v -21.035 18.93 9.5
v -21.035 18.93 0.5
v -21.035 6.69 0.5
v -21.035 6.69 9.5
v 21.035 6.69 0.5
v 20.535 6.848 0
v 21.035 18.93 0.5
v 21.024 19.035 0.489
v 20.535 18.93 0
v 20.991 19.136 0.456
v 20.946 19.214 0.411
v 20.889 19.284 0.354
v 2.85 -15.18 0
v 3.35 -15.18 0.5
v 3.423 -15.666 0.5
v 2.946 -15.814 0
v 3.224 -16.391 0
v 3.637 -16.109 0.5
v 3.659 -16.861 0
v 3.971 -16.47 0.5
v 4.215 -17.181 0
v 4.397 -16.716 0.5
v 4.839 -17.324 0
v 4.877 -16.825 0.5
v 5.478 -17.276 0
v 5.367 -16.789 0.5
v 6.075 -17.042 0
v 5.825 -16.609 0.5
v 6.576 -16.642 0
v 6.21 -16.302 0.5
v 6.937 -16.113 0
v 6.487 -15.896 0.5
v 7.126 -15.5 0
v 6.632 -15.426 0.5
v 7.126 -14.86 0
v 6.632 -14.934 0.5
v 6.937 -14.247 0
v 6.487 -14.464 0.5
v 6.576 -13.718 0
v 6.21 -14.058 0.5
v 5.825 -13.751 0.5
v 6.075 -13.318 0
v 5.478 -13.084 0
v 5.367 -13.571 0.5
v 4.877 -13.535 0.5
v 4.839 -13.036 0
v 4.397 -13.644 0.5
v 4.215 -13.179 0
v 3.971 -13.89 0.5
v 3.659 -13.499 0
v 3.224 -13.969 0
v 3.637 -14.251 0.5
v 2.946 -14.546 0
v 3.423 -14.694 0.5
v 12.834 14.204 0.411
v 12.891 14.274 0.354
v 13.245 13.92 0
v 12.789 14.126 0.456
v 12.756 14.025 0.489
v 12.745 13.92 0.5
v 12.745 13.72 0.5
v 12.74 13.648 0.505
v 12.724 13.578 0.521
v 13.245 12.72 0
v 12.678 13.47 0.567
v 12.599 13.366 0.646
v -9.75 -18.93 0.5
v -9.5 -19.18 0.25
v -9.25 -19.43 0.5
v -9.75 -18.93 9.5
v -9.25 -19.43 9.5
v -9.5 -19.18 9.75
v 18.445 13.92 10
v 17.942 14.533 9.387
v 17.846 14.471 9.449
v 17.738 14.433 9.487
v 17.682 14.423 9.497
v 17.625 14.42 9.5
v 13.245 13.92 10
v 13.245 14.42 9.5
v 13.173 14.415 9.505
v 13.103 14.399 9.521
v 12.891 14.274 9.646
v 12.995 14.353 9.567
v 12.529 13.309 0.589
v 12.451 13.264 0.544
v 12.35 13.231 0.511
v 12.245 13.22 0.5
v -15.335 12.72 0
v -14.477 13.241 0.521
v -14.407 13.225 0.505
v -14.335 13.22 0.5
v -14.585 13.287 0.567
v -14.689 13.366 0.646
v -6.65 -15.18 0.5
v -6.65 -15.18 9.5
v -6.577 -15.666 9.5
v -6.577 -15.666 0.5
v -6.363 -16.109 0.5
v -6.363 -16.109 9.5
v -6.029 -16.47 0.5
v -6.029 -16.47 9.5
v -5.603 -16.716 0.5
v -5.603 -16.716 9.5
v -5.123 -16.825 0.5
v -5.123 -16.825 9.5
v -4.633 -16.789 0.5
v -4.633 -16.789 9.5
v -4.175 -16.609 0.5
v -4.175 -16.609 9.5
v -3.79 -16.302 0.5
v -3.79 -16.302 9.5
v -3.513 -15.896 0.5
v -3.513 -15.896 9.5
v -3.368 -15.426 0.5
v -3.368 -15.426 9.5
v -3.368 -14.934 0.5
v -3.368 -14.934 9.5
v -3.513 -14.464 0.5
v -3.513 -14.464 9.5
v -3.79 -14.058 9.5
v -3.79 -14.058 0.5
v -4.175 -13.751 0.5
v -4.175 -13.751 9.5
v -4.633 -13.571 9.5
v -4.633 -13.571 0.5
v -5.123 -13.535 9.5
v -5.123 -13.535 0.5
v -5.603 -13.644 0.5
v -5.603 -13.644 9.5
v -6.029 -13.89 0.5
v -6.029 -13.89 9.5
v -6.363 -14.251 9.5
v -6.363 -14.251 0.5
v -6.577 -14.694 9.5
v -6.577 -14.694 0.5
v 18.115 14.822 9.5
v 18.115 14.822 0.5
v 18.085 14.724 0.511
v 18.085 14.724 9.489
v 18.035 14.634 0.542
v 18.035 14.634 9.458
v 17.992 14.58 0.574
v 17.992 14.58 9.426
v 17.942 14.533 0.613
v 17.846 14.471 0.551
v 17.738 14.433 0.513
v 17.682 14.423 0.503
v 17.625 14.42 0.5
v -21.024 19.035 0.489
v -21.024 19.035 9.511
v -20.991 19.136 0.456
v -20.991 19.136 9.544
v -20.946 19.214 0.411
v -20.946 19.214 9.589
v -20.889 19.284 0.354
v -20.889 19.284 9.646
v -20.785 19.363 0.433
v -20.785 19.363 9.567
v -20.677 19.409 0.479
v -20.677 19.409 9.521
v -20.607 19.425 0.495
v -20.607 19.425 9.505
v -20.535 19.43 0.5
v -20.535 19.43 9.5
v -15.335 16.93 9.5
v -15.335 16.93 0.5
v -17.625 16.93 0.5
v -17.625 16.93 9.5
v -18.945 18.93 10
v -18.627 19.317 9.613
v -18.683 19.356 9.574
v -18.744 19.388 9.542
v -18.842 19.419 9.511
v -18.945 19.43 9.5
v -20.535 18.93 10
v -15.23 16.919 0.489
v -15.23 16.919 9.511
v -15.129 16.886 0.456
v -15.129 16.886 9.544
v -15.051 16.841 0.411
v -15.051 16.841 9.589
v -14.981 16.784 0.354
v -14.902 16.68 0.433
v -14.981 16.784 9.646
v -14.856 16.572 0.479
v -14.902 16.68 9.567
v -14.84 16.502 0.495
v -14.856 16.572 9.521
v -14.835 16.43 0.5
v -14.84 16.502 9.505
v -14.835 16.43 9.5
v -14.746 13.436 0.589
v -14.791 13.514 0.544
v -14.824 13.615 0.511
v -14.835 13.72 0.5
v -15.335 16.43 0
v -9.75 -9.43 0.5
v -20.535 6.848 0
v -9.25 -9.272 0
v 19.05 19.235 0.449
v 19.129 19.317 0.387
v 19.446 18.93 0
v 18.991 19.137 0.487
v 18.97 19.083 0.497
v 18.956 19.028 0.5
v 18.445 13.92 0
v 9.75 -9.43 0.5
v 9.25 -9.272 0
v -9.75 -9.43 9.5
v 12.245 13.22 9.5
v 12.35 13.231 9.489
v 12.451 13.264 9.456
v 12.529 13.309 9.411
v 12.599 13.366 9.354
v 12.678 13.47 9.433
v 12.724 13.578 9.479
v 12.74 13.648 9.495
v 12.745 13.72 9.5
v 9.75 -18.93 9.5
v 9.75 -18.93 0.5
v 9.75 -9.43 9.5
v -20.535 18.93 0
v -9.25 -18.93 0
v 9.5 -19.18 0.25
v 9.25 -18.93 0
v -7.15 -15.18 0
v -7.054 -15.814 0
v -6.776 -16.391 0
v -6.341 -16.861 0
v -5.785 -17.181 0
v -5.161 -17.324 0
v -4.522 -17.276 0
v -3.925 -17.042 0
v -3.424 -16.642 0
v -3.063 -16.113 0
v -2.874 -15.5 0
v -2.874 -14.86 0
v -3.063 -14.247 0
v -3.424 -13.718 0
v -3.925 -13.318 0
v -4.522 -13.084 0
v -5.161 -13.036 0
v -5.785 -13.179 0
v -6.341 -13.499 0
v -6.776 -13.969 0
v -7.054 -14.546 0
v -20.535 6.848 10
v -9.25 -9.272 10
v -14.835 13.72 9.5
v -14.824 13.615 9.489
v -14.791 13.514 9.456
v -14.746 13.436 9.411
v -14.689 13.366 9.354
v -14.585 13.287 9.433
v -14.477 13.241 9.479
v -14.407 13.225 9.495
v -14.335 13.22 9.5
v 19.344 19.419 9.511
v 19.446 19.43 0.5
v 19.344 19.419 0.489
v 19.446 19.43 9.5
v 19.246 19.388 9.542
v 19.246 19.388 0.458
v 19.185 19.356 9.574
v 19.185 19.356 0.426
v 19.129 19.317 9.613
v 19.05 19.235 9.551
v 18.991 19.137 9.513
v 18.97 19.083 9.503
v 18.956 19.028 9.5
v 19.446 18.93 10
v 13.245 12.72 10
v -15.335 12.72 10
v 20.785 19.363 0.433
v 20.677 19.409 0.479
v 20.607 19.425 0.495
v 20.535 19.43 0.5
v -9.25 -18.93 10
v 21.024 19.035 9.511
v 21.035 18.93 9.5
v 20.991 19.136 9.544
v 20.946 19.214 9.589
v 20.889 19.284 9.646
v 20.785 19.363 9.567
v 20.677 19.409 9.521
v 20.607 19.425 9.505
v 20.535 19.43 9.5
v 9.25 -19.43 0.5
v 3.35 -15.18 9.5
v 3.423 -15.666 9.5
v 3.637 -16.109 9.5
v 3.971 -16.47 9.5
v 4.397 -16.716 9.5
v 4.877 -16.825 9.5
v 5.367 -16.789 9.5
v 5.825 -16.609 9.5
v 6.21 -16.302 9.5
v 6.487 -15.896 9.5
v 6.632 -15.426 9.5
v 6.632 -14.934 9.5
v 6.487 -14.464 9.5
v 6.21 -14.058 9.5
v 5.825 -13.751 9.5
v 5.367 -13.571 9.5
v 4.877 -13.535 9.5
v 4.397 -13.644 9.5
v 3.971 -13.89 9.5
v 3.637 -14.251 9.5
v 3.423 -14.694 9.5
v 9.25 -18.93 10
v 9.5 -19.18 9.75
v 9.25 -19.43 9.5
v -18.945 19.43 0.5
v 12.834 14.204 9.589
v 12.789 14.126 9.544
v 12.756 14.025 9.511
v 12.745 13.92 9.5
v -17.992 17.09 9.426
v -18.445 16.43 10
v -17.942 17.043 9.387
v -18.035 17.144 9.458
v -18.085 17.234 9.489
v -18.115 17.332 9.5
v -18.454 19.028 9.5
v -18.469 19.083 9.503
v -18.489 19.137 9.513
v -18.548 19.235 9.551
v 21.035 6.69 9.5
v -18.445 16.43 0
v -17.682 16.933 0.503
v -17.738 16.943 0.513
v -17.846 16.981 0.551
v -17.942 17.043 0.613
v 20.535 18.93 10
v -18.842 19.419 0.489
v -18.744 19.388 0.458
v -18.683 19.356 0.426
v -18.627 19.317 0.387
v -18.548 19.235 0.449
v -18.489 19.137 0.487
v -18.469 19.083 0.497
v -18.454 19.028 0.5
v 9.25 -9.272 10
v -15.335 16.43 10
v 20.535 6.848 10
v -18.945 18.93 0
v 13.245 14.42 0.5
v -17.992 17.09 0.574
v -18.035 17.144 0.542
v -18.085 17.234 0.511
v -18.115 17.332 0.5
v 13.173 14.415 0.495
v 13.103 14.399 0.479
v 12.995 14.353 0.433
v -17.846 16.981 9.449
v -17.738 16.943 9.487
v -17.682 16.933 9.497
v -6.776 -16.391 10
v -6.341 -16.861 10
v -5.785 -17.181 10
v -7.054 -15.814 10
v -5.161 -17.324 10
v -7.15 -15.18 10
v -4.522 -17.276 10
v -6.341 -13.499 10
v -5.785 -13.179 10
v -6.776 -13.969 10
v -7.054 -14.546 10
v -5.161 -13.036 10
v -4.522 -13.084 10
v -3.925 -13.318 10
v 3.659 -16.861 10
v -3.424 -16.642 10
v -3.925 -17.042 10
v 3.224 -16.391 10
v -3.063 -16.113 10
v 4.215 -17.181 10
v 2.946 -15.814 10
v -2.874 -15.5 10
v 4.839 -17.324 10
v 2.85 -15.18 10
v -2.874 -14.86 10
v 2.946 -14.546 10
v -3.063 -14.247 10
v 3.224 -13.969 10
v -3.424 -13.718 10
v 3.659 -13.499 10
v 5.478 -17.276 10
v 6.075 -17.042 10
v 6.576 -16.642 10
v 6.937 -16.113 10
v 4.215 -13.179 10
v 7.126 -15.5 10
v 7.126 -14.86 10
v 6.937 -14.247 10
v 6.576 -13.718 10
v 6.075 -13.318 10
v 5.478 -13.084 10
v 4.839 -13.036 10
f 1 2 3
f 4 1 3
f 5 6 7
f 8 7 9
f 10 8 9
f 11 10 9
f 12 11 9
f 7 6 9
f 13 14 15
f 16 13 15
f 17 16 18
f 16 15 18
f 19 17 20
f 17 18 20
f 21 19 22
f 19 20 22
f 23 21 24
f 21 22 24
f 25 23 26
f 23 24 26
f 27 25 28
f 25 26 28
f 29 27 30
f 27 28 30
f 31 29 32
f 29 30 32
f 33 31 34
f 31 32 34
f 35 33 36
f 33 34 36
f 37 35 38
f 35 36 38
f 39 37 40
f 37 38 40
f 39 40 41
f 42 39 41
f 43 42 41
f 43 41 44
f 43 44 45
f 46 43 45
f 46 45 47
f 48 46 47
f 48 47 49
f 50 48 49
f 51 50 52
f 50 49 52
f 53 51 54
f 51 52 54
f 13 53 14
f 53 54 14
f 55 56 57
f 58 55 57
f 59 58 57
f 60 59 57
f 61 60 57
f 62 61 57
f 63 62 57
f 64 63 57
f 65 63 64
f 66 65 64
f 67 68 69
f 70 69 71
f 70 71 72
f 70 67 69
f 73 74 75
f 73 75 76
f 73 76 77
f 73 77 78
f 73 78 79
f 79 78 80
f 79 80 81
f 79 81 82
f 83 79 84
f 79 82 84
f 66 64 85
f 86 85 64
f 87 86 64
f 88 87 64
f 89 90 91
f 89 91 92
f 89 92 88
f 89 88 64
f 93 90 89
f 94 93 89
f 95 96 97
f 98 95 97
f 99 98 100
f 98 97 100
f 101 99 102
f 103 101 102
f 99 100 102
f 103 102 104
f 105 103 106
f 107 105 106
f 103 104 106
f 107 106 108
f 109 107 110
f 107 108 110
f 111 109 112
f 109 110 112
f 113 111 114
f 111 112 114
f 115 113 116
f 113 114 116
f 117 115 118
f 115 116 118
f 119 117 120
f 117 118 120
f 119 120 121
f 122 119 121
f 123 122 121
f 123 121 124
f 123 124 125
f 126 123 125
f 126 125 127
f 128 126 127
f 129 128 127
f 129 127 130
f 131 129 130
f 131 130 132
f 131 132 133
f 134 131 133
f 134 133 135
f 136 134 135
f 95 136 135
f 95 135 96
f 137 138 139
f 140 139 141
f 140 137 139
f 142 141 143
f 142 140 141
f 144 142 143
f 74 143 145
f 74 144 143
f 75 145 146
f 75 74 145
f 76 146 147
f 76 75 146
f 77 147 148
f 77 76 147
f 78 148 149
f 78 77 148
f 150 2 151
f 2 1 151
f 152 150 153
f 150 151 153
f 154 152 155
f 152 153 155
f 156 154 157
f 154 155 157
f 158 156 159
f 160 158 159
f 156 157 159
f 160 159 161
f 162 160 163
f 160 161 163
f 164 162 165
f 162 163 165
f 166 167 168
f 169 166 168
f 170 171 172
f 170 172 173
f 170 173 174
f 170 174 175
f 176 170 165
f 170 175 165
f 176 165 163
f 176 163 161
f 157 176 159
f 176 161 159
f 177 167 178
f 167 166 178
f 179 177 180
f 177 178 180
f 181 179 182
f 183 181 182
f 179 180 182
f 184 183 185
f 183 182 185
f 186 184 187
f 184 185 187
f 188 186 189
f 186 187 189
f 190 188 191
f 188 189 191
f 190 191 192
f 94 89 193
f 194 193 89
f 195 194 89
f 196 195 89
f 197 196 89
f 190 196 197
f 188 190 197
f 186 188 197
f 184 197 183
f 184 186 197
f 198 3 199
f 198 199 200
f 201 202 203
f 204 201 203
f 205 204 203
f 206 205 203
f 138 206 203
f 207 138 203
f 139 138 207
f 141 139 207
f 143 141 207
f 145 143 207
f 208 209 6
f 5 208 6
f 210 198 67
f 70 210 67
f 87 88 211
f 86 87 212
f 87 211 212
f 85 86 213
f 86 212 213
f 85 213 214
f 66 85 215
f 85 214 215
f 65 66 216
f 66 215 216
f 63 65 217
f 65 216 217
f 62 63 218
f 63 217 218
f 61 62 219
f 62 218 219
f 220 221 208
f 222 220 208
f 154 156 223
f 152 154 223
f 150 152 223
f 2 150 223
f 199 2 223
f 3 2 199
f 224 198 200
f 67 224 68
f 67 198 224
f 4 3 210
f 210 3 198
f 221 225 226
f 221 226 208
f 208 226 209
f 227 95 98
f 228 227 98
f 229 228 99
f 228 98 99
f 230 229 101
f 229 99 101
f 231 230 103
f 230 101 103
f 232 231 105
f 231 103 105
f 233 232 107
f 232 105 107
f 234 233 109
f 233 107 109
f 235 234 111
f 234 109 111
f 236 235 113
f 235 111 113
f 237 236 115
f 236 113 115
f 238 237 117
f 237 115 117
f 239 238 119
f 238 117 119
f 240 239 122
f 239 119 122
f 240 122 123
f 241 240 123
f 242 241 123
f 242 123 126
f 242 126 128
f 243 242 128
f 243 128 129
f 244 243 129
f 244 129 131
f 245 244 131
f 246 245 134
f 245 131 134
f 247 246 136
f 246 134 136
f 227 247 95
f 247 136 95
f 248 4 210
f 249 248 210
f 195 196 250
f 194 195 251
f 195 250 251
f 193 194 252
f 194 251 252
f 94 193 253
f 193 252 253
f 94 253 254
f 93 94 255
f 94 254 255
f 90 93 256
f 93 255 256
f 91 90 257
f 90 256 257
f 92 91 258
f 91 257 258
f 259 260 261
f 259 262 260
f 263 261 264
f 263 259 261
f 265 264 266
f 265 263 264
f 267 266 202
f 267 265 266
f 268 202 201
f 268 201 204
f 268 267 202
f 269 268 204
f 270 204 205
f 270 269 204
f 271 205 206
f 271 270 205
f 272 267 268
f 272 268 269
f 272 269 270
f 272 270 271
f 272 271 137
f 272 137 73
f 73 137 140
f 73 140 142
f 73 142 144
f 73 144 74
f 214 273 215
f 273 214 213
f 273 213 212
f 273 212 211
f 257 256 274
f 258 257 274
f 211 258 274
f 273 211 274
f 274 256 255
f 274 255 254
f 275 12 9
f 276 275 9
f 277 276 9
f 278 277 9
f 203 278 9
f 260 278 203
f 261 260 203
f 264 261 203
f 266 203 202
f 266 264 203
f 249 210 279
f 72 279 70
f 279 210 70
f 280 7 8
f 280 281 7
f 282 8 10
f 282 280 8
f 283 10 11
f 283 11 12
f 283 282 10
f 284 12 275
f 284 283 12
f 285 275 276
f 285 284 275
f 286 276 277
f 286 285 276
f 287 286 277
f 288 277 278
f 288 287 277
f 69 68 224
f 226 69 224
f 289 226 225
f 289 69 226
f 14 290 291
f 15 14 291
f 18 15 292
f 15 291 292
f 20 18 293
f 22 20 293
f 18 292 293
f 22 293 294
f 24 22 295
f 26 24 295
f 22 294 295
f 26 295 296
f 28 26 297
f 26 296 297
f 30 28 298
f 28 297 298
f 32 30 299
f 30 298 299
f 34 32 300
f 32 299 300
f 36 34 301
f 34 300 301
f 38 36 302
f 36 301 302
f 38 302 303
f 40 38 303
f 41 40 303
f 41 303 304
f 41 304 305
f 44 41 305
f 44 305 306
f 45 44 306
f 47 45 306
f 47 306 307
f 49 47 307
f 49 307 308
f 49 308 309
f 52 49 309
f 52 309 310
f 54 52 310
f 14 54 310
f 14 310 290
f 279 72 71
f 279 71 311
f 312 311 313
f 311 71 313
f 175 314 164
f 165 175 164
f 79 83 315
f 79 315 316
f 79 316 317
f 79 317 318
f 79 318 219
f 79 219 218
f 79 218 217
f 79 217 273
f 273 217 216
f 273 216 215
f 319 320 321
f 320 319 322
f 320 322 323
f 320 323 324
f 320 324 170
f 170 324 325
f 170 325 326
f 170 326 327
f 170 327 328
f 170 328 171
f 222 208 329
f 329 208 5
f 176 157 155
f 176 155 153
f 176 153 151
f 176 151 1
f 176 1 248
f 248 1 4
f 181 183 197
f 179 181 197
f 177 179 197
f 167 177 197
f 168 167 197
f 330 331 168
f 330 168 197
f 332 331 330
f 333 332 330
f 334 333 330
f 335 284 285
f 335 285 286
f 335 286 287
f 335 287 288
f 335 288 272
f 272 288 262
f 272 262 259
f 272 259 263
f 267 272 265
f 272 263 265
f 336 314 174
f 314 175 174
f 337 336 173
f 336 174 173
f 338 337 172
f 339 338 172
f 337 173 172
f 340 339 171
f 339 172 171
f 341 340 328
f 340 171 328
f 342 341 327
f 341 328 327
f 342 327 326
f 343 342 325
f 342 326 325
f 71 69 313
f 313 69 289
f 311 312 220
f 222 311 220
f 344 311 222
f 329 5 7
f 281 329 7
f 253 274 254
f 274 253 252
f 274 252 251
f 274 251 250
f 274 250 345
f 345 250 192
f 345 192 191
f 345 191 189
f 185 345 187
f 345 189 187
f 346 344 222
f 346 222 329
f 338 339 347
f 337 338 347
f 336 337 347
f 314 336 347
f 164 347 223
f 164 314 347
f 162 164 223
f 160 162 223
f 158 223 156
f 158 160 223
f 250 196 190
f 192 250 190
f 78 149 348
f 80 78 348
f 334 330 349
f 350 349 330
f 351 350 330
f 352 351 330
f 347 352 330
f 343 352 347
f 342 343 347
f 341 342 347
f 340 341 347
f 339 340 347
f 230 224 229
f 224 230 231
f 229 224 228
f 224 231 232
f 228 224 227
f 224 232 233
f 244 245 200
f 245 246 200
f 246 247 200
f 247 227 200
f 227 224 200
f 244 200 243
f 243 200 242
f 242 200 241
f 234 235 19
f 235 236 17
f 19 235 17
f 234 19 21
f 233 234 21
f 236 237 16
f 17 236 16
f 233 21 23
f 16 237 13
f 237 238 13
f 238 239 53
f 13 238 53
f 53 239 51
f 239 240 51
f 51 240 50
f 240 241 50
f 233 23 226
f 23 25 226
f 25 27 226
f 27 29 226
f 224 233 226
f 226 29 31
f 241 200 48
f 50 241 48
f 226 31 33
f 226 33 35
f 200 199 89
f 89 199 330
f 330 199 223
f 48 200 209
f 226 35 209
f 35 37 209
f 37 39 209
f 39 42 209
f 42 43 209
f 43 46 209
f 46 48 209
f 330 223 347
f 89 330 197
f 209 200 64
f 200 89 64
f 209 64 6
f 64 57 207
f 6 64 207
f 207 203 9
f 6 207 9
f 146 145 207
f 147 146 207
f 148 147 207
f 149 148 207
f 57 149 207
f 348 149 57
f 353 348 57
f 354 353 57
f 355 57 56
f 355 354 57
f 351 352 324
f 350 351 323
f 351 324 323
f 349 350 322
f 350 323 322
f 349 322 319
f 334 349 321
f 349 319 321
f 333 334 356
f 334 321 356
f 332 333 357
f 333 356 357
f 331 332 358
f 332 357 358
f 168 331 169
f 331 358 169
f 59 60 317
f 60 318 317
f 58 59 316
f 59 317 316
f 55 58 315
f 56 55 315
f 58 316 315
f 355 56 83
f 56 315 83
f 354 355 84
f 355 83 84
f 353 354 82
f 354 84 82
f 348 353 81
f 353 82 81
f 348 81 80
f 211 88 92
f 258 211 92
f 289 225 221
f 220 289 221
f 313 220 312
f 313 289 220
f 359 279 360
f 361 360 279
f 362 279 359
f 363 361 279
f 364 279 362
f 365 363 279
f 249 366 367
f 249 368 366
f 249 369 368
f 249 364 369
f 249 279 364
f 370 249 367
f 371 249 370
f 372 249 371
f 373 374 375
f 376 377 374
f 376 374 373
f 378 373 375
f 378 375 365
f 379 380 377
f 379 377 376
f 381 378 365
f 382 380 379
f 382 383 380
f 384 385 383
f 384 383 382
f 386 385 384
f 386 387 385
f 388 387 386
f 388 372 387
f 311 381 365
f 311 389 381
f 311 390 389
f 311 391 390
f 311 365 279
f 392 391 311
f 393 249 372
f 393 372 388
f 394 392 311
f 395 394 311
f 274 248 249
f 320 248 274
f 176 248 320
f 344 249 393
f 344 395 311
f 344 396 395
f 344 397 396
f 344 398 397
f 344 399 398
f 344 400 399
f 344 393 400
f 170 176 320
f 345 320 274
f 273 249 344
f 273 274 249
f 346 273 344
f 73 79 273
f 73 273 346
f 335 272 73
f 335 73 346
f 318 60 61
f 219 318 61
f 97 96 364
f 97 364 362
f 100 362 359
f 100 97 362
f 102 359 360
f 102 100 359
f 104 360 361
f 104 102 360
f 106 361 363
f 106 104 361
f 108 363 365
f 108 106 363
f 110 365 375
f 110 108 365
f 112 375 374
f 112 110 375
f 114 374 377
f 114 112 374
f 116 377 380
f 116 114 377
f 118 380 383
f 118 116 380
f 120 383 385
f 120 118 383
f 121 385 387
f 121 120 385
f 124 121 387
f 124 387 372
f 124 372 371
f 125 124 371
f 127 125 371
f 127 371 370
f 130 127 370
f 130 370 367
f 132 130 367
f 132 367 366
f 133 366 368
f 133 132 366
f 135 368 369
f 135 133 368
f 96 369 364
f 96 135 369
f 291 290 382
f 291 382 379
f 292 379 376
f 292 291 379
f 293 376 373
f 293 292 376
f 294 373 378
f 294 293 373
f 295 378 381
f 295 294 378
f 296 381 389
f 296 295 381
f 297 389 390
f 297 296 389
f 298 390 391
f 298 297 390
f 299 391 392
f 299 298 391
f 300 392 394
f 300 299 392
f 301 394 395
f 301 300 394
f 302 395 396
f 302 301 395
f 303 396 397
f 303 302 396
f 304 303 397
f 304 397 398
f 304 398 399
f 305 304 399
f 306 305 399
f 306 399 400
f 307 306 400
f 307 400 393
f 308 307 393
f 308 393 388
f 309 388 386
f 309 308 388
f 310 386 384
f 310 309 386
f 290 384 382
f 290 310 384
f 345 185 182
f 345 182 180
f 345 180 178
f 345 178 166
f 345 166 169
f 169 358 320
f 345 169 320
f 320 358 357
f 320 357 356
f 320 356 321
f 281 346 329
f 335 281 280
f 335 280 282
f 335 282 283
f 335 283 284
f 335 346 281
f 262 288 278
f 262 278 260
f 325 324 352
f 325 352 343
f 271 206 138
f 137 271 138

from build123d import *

# Parameters (mm, degrees)
F1_DEPTH = 10
F2_D     = 3.3
F3_SIZE  = 0.5
F4_R     = 0.5
F5_SIZE  = 0.5


with BuildPart() as f1:
    # F0 (on Top) → F1 (new body)
    with BuildSketch(Plane.XY):
        Polygon((9.75, -9.43), (21.035, 6.69), (21.035, 19.43), (19.0360967857, 19.43), (18.035, 14.42), (12.745, 14.42), (12.745, 13.22), (-14.835, 13.22), (-14.835, 16.93), (-18.035, 16.93), (-18.5345492942, 19.43), (-21.035, 19.43), (-21.035, 6.69), (-9.75, -9.43), (-9.75, -19.43), (9.75, -19.43), align=None)
    extrude(amount=F1_DEPTH)

    # F2 (through all)
    with Locations(Plane(origin=(0, 0, 0), x_dir=(1, 0, 0), z_dir=(0, 0, -1))):
        with Locations((5, 15.18), (-5, 15.18)):
            Hole(F2_D / 2)

    # F3
    f3_edges = [f1.edges().sort_by_distance(p)[0] for p in [
        (-15.3925, -1.37, 10),
        (-21.035, 13.06, 10),
        (-9.75, -14.43, 10),
        (-19.784775, 19.43, 10),
        (0, -19.43, 10),
        (-18.284775, 18.18, 10),
        (9.75, -14.43, 10),
        (-16.435, 16.93, 10),
        (15.3925, -1.37, 10),
        (-14.835, 15.075, 10),
        (21.035, 13.06, 10),
        (-1.045, 13.22, 10),
        (20.035548, 19.43, 10),
        (12.745, 13.82, 10),
        (18.535548, 16.925, 10),
        (15.39, 14.42, 10),
        (-6.65, -15.18, 10),
        (3.35, -15.18, 10),
        (-15.3925, -1.37, 0),
        (-21.035, 13.06, 0),
        (-9.75, -14.43, 0),
        (-19.784775, 19.43, 0),
        (0, -19.43, 0),
        (-18.284775, 18.18, 0),
        (9.75, -14.43, 0),
        (-16.435, 16.93, 0),
        (15.3925, -1.37, 0),
        (-14.835, 15.075, 0),
        (21.035, 13.06, 0),
        (-1.045, 13.22, 0),
        (20.035548, 19.43, 0),
        (12.745, 13.82, 0),
        (18.535548, 16.925, 0),
        (15.39, 14.42, 0),
        (-6.65, -15.18, 0),
        (3.35, -15.18, 0),
    ]]
    chamfer(f3_edges, length=F3_SIZE)

    # F4
    f4_edges = [f1.edges().sort_by_distance(p)[0] for p in [
        (-21.035, 19.43, 5),
        (-18.534549, 19.43, 5),
        (-18.035, 16.93, 5),
        (-14.835, 16.93, 5),
        (-14.835, 13.22, 5),
        (21.035, 19.43, 5),
        (19.036097, 19.43, 5),
        (18.035, 14.42, 5),
        (12.745, 14.42, 5),
        (12.745, 13.22, 5),
    ]]
    fillet(f4_edges, radius=F4_R)

    # F5
    f5_edges = [f1.edges().sort_by_distance(p)[0] for p in [
        (-9.75, -19.43, 5),
        (9.75, -19.43, 5),
    ]]
    chamfer(f5_edges, length=F5_SIZE)


solid = f1.part
